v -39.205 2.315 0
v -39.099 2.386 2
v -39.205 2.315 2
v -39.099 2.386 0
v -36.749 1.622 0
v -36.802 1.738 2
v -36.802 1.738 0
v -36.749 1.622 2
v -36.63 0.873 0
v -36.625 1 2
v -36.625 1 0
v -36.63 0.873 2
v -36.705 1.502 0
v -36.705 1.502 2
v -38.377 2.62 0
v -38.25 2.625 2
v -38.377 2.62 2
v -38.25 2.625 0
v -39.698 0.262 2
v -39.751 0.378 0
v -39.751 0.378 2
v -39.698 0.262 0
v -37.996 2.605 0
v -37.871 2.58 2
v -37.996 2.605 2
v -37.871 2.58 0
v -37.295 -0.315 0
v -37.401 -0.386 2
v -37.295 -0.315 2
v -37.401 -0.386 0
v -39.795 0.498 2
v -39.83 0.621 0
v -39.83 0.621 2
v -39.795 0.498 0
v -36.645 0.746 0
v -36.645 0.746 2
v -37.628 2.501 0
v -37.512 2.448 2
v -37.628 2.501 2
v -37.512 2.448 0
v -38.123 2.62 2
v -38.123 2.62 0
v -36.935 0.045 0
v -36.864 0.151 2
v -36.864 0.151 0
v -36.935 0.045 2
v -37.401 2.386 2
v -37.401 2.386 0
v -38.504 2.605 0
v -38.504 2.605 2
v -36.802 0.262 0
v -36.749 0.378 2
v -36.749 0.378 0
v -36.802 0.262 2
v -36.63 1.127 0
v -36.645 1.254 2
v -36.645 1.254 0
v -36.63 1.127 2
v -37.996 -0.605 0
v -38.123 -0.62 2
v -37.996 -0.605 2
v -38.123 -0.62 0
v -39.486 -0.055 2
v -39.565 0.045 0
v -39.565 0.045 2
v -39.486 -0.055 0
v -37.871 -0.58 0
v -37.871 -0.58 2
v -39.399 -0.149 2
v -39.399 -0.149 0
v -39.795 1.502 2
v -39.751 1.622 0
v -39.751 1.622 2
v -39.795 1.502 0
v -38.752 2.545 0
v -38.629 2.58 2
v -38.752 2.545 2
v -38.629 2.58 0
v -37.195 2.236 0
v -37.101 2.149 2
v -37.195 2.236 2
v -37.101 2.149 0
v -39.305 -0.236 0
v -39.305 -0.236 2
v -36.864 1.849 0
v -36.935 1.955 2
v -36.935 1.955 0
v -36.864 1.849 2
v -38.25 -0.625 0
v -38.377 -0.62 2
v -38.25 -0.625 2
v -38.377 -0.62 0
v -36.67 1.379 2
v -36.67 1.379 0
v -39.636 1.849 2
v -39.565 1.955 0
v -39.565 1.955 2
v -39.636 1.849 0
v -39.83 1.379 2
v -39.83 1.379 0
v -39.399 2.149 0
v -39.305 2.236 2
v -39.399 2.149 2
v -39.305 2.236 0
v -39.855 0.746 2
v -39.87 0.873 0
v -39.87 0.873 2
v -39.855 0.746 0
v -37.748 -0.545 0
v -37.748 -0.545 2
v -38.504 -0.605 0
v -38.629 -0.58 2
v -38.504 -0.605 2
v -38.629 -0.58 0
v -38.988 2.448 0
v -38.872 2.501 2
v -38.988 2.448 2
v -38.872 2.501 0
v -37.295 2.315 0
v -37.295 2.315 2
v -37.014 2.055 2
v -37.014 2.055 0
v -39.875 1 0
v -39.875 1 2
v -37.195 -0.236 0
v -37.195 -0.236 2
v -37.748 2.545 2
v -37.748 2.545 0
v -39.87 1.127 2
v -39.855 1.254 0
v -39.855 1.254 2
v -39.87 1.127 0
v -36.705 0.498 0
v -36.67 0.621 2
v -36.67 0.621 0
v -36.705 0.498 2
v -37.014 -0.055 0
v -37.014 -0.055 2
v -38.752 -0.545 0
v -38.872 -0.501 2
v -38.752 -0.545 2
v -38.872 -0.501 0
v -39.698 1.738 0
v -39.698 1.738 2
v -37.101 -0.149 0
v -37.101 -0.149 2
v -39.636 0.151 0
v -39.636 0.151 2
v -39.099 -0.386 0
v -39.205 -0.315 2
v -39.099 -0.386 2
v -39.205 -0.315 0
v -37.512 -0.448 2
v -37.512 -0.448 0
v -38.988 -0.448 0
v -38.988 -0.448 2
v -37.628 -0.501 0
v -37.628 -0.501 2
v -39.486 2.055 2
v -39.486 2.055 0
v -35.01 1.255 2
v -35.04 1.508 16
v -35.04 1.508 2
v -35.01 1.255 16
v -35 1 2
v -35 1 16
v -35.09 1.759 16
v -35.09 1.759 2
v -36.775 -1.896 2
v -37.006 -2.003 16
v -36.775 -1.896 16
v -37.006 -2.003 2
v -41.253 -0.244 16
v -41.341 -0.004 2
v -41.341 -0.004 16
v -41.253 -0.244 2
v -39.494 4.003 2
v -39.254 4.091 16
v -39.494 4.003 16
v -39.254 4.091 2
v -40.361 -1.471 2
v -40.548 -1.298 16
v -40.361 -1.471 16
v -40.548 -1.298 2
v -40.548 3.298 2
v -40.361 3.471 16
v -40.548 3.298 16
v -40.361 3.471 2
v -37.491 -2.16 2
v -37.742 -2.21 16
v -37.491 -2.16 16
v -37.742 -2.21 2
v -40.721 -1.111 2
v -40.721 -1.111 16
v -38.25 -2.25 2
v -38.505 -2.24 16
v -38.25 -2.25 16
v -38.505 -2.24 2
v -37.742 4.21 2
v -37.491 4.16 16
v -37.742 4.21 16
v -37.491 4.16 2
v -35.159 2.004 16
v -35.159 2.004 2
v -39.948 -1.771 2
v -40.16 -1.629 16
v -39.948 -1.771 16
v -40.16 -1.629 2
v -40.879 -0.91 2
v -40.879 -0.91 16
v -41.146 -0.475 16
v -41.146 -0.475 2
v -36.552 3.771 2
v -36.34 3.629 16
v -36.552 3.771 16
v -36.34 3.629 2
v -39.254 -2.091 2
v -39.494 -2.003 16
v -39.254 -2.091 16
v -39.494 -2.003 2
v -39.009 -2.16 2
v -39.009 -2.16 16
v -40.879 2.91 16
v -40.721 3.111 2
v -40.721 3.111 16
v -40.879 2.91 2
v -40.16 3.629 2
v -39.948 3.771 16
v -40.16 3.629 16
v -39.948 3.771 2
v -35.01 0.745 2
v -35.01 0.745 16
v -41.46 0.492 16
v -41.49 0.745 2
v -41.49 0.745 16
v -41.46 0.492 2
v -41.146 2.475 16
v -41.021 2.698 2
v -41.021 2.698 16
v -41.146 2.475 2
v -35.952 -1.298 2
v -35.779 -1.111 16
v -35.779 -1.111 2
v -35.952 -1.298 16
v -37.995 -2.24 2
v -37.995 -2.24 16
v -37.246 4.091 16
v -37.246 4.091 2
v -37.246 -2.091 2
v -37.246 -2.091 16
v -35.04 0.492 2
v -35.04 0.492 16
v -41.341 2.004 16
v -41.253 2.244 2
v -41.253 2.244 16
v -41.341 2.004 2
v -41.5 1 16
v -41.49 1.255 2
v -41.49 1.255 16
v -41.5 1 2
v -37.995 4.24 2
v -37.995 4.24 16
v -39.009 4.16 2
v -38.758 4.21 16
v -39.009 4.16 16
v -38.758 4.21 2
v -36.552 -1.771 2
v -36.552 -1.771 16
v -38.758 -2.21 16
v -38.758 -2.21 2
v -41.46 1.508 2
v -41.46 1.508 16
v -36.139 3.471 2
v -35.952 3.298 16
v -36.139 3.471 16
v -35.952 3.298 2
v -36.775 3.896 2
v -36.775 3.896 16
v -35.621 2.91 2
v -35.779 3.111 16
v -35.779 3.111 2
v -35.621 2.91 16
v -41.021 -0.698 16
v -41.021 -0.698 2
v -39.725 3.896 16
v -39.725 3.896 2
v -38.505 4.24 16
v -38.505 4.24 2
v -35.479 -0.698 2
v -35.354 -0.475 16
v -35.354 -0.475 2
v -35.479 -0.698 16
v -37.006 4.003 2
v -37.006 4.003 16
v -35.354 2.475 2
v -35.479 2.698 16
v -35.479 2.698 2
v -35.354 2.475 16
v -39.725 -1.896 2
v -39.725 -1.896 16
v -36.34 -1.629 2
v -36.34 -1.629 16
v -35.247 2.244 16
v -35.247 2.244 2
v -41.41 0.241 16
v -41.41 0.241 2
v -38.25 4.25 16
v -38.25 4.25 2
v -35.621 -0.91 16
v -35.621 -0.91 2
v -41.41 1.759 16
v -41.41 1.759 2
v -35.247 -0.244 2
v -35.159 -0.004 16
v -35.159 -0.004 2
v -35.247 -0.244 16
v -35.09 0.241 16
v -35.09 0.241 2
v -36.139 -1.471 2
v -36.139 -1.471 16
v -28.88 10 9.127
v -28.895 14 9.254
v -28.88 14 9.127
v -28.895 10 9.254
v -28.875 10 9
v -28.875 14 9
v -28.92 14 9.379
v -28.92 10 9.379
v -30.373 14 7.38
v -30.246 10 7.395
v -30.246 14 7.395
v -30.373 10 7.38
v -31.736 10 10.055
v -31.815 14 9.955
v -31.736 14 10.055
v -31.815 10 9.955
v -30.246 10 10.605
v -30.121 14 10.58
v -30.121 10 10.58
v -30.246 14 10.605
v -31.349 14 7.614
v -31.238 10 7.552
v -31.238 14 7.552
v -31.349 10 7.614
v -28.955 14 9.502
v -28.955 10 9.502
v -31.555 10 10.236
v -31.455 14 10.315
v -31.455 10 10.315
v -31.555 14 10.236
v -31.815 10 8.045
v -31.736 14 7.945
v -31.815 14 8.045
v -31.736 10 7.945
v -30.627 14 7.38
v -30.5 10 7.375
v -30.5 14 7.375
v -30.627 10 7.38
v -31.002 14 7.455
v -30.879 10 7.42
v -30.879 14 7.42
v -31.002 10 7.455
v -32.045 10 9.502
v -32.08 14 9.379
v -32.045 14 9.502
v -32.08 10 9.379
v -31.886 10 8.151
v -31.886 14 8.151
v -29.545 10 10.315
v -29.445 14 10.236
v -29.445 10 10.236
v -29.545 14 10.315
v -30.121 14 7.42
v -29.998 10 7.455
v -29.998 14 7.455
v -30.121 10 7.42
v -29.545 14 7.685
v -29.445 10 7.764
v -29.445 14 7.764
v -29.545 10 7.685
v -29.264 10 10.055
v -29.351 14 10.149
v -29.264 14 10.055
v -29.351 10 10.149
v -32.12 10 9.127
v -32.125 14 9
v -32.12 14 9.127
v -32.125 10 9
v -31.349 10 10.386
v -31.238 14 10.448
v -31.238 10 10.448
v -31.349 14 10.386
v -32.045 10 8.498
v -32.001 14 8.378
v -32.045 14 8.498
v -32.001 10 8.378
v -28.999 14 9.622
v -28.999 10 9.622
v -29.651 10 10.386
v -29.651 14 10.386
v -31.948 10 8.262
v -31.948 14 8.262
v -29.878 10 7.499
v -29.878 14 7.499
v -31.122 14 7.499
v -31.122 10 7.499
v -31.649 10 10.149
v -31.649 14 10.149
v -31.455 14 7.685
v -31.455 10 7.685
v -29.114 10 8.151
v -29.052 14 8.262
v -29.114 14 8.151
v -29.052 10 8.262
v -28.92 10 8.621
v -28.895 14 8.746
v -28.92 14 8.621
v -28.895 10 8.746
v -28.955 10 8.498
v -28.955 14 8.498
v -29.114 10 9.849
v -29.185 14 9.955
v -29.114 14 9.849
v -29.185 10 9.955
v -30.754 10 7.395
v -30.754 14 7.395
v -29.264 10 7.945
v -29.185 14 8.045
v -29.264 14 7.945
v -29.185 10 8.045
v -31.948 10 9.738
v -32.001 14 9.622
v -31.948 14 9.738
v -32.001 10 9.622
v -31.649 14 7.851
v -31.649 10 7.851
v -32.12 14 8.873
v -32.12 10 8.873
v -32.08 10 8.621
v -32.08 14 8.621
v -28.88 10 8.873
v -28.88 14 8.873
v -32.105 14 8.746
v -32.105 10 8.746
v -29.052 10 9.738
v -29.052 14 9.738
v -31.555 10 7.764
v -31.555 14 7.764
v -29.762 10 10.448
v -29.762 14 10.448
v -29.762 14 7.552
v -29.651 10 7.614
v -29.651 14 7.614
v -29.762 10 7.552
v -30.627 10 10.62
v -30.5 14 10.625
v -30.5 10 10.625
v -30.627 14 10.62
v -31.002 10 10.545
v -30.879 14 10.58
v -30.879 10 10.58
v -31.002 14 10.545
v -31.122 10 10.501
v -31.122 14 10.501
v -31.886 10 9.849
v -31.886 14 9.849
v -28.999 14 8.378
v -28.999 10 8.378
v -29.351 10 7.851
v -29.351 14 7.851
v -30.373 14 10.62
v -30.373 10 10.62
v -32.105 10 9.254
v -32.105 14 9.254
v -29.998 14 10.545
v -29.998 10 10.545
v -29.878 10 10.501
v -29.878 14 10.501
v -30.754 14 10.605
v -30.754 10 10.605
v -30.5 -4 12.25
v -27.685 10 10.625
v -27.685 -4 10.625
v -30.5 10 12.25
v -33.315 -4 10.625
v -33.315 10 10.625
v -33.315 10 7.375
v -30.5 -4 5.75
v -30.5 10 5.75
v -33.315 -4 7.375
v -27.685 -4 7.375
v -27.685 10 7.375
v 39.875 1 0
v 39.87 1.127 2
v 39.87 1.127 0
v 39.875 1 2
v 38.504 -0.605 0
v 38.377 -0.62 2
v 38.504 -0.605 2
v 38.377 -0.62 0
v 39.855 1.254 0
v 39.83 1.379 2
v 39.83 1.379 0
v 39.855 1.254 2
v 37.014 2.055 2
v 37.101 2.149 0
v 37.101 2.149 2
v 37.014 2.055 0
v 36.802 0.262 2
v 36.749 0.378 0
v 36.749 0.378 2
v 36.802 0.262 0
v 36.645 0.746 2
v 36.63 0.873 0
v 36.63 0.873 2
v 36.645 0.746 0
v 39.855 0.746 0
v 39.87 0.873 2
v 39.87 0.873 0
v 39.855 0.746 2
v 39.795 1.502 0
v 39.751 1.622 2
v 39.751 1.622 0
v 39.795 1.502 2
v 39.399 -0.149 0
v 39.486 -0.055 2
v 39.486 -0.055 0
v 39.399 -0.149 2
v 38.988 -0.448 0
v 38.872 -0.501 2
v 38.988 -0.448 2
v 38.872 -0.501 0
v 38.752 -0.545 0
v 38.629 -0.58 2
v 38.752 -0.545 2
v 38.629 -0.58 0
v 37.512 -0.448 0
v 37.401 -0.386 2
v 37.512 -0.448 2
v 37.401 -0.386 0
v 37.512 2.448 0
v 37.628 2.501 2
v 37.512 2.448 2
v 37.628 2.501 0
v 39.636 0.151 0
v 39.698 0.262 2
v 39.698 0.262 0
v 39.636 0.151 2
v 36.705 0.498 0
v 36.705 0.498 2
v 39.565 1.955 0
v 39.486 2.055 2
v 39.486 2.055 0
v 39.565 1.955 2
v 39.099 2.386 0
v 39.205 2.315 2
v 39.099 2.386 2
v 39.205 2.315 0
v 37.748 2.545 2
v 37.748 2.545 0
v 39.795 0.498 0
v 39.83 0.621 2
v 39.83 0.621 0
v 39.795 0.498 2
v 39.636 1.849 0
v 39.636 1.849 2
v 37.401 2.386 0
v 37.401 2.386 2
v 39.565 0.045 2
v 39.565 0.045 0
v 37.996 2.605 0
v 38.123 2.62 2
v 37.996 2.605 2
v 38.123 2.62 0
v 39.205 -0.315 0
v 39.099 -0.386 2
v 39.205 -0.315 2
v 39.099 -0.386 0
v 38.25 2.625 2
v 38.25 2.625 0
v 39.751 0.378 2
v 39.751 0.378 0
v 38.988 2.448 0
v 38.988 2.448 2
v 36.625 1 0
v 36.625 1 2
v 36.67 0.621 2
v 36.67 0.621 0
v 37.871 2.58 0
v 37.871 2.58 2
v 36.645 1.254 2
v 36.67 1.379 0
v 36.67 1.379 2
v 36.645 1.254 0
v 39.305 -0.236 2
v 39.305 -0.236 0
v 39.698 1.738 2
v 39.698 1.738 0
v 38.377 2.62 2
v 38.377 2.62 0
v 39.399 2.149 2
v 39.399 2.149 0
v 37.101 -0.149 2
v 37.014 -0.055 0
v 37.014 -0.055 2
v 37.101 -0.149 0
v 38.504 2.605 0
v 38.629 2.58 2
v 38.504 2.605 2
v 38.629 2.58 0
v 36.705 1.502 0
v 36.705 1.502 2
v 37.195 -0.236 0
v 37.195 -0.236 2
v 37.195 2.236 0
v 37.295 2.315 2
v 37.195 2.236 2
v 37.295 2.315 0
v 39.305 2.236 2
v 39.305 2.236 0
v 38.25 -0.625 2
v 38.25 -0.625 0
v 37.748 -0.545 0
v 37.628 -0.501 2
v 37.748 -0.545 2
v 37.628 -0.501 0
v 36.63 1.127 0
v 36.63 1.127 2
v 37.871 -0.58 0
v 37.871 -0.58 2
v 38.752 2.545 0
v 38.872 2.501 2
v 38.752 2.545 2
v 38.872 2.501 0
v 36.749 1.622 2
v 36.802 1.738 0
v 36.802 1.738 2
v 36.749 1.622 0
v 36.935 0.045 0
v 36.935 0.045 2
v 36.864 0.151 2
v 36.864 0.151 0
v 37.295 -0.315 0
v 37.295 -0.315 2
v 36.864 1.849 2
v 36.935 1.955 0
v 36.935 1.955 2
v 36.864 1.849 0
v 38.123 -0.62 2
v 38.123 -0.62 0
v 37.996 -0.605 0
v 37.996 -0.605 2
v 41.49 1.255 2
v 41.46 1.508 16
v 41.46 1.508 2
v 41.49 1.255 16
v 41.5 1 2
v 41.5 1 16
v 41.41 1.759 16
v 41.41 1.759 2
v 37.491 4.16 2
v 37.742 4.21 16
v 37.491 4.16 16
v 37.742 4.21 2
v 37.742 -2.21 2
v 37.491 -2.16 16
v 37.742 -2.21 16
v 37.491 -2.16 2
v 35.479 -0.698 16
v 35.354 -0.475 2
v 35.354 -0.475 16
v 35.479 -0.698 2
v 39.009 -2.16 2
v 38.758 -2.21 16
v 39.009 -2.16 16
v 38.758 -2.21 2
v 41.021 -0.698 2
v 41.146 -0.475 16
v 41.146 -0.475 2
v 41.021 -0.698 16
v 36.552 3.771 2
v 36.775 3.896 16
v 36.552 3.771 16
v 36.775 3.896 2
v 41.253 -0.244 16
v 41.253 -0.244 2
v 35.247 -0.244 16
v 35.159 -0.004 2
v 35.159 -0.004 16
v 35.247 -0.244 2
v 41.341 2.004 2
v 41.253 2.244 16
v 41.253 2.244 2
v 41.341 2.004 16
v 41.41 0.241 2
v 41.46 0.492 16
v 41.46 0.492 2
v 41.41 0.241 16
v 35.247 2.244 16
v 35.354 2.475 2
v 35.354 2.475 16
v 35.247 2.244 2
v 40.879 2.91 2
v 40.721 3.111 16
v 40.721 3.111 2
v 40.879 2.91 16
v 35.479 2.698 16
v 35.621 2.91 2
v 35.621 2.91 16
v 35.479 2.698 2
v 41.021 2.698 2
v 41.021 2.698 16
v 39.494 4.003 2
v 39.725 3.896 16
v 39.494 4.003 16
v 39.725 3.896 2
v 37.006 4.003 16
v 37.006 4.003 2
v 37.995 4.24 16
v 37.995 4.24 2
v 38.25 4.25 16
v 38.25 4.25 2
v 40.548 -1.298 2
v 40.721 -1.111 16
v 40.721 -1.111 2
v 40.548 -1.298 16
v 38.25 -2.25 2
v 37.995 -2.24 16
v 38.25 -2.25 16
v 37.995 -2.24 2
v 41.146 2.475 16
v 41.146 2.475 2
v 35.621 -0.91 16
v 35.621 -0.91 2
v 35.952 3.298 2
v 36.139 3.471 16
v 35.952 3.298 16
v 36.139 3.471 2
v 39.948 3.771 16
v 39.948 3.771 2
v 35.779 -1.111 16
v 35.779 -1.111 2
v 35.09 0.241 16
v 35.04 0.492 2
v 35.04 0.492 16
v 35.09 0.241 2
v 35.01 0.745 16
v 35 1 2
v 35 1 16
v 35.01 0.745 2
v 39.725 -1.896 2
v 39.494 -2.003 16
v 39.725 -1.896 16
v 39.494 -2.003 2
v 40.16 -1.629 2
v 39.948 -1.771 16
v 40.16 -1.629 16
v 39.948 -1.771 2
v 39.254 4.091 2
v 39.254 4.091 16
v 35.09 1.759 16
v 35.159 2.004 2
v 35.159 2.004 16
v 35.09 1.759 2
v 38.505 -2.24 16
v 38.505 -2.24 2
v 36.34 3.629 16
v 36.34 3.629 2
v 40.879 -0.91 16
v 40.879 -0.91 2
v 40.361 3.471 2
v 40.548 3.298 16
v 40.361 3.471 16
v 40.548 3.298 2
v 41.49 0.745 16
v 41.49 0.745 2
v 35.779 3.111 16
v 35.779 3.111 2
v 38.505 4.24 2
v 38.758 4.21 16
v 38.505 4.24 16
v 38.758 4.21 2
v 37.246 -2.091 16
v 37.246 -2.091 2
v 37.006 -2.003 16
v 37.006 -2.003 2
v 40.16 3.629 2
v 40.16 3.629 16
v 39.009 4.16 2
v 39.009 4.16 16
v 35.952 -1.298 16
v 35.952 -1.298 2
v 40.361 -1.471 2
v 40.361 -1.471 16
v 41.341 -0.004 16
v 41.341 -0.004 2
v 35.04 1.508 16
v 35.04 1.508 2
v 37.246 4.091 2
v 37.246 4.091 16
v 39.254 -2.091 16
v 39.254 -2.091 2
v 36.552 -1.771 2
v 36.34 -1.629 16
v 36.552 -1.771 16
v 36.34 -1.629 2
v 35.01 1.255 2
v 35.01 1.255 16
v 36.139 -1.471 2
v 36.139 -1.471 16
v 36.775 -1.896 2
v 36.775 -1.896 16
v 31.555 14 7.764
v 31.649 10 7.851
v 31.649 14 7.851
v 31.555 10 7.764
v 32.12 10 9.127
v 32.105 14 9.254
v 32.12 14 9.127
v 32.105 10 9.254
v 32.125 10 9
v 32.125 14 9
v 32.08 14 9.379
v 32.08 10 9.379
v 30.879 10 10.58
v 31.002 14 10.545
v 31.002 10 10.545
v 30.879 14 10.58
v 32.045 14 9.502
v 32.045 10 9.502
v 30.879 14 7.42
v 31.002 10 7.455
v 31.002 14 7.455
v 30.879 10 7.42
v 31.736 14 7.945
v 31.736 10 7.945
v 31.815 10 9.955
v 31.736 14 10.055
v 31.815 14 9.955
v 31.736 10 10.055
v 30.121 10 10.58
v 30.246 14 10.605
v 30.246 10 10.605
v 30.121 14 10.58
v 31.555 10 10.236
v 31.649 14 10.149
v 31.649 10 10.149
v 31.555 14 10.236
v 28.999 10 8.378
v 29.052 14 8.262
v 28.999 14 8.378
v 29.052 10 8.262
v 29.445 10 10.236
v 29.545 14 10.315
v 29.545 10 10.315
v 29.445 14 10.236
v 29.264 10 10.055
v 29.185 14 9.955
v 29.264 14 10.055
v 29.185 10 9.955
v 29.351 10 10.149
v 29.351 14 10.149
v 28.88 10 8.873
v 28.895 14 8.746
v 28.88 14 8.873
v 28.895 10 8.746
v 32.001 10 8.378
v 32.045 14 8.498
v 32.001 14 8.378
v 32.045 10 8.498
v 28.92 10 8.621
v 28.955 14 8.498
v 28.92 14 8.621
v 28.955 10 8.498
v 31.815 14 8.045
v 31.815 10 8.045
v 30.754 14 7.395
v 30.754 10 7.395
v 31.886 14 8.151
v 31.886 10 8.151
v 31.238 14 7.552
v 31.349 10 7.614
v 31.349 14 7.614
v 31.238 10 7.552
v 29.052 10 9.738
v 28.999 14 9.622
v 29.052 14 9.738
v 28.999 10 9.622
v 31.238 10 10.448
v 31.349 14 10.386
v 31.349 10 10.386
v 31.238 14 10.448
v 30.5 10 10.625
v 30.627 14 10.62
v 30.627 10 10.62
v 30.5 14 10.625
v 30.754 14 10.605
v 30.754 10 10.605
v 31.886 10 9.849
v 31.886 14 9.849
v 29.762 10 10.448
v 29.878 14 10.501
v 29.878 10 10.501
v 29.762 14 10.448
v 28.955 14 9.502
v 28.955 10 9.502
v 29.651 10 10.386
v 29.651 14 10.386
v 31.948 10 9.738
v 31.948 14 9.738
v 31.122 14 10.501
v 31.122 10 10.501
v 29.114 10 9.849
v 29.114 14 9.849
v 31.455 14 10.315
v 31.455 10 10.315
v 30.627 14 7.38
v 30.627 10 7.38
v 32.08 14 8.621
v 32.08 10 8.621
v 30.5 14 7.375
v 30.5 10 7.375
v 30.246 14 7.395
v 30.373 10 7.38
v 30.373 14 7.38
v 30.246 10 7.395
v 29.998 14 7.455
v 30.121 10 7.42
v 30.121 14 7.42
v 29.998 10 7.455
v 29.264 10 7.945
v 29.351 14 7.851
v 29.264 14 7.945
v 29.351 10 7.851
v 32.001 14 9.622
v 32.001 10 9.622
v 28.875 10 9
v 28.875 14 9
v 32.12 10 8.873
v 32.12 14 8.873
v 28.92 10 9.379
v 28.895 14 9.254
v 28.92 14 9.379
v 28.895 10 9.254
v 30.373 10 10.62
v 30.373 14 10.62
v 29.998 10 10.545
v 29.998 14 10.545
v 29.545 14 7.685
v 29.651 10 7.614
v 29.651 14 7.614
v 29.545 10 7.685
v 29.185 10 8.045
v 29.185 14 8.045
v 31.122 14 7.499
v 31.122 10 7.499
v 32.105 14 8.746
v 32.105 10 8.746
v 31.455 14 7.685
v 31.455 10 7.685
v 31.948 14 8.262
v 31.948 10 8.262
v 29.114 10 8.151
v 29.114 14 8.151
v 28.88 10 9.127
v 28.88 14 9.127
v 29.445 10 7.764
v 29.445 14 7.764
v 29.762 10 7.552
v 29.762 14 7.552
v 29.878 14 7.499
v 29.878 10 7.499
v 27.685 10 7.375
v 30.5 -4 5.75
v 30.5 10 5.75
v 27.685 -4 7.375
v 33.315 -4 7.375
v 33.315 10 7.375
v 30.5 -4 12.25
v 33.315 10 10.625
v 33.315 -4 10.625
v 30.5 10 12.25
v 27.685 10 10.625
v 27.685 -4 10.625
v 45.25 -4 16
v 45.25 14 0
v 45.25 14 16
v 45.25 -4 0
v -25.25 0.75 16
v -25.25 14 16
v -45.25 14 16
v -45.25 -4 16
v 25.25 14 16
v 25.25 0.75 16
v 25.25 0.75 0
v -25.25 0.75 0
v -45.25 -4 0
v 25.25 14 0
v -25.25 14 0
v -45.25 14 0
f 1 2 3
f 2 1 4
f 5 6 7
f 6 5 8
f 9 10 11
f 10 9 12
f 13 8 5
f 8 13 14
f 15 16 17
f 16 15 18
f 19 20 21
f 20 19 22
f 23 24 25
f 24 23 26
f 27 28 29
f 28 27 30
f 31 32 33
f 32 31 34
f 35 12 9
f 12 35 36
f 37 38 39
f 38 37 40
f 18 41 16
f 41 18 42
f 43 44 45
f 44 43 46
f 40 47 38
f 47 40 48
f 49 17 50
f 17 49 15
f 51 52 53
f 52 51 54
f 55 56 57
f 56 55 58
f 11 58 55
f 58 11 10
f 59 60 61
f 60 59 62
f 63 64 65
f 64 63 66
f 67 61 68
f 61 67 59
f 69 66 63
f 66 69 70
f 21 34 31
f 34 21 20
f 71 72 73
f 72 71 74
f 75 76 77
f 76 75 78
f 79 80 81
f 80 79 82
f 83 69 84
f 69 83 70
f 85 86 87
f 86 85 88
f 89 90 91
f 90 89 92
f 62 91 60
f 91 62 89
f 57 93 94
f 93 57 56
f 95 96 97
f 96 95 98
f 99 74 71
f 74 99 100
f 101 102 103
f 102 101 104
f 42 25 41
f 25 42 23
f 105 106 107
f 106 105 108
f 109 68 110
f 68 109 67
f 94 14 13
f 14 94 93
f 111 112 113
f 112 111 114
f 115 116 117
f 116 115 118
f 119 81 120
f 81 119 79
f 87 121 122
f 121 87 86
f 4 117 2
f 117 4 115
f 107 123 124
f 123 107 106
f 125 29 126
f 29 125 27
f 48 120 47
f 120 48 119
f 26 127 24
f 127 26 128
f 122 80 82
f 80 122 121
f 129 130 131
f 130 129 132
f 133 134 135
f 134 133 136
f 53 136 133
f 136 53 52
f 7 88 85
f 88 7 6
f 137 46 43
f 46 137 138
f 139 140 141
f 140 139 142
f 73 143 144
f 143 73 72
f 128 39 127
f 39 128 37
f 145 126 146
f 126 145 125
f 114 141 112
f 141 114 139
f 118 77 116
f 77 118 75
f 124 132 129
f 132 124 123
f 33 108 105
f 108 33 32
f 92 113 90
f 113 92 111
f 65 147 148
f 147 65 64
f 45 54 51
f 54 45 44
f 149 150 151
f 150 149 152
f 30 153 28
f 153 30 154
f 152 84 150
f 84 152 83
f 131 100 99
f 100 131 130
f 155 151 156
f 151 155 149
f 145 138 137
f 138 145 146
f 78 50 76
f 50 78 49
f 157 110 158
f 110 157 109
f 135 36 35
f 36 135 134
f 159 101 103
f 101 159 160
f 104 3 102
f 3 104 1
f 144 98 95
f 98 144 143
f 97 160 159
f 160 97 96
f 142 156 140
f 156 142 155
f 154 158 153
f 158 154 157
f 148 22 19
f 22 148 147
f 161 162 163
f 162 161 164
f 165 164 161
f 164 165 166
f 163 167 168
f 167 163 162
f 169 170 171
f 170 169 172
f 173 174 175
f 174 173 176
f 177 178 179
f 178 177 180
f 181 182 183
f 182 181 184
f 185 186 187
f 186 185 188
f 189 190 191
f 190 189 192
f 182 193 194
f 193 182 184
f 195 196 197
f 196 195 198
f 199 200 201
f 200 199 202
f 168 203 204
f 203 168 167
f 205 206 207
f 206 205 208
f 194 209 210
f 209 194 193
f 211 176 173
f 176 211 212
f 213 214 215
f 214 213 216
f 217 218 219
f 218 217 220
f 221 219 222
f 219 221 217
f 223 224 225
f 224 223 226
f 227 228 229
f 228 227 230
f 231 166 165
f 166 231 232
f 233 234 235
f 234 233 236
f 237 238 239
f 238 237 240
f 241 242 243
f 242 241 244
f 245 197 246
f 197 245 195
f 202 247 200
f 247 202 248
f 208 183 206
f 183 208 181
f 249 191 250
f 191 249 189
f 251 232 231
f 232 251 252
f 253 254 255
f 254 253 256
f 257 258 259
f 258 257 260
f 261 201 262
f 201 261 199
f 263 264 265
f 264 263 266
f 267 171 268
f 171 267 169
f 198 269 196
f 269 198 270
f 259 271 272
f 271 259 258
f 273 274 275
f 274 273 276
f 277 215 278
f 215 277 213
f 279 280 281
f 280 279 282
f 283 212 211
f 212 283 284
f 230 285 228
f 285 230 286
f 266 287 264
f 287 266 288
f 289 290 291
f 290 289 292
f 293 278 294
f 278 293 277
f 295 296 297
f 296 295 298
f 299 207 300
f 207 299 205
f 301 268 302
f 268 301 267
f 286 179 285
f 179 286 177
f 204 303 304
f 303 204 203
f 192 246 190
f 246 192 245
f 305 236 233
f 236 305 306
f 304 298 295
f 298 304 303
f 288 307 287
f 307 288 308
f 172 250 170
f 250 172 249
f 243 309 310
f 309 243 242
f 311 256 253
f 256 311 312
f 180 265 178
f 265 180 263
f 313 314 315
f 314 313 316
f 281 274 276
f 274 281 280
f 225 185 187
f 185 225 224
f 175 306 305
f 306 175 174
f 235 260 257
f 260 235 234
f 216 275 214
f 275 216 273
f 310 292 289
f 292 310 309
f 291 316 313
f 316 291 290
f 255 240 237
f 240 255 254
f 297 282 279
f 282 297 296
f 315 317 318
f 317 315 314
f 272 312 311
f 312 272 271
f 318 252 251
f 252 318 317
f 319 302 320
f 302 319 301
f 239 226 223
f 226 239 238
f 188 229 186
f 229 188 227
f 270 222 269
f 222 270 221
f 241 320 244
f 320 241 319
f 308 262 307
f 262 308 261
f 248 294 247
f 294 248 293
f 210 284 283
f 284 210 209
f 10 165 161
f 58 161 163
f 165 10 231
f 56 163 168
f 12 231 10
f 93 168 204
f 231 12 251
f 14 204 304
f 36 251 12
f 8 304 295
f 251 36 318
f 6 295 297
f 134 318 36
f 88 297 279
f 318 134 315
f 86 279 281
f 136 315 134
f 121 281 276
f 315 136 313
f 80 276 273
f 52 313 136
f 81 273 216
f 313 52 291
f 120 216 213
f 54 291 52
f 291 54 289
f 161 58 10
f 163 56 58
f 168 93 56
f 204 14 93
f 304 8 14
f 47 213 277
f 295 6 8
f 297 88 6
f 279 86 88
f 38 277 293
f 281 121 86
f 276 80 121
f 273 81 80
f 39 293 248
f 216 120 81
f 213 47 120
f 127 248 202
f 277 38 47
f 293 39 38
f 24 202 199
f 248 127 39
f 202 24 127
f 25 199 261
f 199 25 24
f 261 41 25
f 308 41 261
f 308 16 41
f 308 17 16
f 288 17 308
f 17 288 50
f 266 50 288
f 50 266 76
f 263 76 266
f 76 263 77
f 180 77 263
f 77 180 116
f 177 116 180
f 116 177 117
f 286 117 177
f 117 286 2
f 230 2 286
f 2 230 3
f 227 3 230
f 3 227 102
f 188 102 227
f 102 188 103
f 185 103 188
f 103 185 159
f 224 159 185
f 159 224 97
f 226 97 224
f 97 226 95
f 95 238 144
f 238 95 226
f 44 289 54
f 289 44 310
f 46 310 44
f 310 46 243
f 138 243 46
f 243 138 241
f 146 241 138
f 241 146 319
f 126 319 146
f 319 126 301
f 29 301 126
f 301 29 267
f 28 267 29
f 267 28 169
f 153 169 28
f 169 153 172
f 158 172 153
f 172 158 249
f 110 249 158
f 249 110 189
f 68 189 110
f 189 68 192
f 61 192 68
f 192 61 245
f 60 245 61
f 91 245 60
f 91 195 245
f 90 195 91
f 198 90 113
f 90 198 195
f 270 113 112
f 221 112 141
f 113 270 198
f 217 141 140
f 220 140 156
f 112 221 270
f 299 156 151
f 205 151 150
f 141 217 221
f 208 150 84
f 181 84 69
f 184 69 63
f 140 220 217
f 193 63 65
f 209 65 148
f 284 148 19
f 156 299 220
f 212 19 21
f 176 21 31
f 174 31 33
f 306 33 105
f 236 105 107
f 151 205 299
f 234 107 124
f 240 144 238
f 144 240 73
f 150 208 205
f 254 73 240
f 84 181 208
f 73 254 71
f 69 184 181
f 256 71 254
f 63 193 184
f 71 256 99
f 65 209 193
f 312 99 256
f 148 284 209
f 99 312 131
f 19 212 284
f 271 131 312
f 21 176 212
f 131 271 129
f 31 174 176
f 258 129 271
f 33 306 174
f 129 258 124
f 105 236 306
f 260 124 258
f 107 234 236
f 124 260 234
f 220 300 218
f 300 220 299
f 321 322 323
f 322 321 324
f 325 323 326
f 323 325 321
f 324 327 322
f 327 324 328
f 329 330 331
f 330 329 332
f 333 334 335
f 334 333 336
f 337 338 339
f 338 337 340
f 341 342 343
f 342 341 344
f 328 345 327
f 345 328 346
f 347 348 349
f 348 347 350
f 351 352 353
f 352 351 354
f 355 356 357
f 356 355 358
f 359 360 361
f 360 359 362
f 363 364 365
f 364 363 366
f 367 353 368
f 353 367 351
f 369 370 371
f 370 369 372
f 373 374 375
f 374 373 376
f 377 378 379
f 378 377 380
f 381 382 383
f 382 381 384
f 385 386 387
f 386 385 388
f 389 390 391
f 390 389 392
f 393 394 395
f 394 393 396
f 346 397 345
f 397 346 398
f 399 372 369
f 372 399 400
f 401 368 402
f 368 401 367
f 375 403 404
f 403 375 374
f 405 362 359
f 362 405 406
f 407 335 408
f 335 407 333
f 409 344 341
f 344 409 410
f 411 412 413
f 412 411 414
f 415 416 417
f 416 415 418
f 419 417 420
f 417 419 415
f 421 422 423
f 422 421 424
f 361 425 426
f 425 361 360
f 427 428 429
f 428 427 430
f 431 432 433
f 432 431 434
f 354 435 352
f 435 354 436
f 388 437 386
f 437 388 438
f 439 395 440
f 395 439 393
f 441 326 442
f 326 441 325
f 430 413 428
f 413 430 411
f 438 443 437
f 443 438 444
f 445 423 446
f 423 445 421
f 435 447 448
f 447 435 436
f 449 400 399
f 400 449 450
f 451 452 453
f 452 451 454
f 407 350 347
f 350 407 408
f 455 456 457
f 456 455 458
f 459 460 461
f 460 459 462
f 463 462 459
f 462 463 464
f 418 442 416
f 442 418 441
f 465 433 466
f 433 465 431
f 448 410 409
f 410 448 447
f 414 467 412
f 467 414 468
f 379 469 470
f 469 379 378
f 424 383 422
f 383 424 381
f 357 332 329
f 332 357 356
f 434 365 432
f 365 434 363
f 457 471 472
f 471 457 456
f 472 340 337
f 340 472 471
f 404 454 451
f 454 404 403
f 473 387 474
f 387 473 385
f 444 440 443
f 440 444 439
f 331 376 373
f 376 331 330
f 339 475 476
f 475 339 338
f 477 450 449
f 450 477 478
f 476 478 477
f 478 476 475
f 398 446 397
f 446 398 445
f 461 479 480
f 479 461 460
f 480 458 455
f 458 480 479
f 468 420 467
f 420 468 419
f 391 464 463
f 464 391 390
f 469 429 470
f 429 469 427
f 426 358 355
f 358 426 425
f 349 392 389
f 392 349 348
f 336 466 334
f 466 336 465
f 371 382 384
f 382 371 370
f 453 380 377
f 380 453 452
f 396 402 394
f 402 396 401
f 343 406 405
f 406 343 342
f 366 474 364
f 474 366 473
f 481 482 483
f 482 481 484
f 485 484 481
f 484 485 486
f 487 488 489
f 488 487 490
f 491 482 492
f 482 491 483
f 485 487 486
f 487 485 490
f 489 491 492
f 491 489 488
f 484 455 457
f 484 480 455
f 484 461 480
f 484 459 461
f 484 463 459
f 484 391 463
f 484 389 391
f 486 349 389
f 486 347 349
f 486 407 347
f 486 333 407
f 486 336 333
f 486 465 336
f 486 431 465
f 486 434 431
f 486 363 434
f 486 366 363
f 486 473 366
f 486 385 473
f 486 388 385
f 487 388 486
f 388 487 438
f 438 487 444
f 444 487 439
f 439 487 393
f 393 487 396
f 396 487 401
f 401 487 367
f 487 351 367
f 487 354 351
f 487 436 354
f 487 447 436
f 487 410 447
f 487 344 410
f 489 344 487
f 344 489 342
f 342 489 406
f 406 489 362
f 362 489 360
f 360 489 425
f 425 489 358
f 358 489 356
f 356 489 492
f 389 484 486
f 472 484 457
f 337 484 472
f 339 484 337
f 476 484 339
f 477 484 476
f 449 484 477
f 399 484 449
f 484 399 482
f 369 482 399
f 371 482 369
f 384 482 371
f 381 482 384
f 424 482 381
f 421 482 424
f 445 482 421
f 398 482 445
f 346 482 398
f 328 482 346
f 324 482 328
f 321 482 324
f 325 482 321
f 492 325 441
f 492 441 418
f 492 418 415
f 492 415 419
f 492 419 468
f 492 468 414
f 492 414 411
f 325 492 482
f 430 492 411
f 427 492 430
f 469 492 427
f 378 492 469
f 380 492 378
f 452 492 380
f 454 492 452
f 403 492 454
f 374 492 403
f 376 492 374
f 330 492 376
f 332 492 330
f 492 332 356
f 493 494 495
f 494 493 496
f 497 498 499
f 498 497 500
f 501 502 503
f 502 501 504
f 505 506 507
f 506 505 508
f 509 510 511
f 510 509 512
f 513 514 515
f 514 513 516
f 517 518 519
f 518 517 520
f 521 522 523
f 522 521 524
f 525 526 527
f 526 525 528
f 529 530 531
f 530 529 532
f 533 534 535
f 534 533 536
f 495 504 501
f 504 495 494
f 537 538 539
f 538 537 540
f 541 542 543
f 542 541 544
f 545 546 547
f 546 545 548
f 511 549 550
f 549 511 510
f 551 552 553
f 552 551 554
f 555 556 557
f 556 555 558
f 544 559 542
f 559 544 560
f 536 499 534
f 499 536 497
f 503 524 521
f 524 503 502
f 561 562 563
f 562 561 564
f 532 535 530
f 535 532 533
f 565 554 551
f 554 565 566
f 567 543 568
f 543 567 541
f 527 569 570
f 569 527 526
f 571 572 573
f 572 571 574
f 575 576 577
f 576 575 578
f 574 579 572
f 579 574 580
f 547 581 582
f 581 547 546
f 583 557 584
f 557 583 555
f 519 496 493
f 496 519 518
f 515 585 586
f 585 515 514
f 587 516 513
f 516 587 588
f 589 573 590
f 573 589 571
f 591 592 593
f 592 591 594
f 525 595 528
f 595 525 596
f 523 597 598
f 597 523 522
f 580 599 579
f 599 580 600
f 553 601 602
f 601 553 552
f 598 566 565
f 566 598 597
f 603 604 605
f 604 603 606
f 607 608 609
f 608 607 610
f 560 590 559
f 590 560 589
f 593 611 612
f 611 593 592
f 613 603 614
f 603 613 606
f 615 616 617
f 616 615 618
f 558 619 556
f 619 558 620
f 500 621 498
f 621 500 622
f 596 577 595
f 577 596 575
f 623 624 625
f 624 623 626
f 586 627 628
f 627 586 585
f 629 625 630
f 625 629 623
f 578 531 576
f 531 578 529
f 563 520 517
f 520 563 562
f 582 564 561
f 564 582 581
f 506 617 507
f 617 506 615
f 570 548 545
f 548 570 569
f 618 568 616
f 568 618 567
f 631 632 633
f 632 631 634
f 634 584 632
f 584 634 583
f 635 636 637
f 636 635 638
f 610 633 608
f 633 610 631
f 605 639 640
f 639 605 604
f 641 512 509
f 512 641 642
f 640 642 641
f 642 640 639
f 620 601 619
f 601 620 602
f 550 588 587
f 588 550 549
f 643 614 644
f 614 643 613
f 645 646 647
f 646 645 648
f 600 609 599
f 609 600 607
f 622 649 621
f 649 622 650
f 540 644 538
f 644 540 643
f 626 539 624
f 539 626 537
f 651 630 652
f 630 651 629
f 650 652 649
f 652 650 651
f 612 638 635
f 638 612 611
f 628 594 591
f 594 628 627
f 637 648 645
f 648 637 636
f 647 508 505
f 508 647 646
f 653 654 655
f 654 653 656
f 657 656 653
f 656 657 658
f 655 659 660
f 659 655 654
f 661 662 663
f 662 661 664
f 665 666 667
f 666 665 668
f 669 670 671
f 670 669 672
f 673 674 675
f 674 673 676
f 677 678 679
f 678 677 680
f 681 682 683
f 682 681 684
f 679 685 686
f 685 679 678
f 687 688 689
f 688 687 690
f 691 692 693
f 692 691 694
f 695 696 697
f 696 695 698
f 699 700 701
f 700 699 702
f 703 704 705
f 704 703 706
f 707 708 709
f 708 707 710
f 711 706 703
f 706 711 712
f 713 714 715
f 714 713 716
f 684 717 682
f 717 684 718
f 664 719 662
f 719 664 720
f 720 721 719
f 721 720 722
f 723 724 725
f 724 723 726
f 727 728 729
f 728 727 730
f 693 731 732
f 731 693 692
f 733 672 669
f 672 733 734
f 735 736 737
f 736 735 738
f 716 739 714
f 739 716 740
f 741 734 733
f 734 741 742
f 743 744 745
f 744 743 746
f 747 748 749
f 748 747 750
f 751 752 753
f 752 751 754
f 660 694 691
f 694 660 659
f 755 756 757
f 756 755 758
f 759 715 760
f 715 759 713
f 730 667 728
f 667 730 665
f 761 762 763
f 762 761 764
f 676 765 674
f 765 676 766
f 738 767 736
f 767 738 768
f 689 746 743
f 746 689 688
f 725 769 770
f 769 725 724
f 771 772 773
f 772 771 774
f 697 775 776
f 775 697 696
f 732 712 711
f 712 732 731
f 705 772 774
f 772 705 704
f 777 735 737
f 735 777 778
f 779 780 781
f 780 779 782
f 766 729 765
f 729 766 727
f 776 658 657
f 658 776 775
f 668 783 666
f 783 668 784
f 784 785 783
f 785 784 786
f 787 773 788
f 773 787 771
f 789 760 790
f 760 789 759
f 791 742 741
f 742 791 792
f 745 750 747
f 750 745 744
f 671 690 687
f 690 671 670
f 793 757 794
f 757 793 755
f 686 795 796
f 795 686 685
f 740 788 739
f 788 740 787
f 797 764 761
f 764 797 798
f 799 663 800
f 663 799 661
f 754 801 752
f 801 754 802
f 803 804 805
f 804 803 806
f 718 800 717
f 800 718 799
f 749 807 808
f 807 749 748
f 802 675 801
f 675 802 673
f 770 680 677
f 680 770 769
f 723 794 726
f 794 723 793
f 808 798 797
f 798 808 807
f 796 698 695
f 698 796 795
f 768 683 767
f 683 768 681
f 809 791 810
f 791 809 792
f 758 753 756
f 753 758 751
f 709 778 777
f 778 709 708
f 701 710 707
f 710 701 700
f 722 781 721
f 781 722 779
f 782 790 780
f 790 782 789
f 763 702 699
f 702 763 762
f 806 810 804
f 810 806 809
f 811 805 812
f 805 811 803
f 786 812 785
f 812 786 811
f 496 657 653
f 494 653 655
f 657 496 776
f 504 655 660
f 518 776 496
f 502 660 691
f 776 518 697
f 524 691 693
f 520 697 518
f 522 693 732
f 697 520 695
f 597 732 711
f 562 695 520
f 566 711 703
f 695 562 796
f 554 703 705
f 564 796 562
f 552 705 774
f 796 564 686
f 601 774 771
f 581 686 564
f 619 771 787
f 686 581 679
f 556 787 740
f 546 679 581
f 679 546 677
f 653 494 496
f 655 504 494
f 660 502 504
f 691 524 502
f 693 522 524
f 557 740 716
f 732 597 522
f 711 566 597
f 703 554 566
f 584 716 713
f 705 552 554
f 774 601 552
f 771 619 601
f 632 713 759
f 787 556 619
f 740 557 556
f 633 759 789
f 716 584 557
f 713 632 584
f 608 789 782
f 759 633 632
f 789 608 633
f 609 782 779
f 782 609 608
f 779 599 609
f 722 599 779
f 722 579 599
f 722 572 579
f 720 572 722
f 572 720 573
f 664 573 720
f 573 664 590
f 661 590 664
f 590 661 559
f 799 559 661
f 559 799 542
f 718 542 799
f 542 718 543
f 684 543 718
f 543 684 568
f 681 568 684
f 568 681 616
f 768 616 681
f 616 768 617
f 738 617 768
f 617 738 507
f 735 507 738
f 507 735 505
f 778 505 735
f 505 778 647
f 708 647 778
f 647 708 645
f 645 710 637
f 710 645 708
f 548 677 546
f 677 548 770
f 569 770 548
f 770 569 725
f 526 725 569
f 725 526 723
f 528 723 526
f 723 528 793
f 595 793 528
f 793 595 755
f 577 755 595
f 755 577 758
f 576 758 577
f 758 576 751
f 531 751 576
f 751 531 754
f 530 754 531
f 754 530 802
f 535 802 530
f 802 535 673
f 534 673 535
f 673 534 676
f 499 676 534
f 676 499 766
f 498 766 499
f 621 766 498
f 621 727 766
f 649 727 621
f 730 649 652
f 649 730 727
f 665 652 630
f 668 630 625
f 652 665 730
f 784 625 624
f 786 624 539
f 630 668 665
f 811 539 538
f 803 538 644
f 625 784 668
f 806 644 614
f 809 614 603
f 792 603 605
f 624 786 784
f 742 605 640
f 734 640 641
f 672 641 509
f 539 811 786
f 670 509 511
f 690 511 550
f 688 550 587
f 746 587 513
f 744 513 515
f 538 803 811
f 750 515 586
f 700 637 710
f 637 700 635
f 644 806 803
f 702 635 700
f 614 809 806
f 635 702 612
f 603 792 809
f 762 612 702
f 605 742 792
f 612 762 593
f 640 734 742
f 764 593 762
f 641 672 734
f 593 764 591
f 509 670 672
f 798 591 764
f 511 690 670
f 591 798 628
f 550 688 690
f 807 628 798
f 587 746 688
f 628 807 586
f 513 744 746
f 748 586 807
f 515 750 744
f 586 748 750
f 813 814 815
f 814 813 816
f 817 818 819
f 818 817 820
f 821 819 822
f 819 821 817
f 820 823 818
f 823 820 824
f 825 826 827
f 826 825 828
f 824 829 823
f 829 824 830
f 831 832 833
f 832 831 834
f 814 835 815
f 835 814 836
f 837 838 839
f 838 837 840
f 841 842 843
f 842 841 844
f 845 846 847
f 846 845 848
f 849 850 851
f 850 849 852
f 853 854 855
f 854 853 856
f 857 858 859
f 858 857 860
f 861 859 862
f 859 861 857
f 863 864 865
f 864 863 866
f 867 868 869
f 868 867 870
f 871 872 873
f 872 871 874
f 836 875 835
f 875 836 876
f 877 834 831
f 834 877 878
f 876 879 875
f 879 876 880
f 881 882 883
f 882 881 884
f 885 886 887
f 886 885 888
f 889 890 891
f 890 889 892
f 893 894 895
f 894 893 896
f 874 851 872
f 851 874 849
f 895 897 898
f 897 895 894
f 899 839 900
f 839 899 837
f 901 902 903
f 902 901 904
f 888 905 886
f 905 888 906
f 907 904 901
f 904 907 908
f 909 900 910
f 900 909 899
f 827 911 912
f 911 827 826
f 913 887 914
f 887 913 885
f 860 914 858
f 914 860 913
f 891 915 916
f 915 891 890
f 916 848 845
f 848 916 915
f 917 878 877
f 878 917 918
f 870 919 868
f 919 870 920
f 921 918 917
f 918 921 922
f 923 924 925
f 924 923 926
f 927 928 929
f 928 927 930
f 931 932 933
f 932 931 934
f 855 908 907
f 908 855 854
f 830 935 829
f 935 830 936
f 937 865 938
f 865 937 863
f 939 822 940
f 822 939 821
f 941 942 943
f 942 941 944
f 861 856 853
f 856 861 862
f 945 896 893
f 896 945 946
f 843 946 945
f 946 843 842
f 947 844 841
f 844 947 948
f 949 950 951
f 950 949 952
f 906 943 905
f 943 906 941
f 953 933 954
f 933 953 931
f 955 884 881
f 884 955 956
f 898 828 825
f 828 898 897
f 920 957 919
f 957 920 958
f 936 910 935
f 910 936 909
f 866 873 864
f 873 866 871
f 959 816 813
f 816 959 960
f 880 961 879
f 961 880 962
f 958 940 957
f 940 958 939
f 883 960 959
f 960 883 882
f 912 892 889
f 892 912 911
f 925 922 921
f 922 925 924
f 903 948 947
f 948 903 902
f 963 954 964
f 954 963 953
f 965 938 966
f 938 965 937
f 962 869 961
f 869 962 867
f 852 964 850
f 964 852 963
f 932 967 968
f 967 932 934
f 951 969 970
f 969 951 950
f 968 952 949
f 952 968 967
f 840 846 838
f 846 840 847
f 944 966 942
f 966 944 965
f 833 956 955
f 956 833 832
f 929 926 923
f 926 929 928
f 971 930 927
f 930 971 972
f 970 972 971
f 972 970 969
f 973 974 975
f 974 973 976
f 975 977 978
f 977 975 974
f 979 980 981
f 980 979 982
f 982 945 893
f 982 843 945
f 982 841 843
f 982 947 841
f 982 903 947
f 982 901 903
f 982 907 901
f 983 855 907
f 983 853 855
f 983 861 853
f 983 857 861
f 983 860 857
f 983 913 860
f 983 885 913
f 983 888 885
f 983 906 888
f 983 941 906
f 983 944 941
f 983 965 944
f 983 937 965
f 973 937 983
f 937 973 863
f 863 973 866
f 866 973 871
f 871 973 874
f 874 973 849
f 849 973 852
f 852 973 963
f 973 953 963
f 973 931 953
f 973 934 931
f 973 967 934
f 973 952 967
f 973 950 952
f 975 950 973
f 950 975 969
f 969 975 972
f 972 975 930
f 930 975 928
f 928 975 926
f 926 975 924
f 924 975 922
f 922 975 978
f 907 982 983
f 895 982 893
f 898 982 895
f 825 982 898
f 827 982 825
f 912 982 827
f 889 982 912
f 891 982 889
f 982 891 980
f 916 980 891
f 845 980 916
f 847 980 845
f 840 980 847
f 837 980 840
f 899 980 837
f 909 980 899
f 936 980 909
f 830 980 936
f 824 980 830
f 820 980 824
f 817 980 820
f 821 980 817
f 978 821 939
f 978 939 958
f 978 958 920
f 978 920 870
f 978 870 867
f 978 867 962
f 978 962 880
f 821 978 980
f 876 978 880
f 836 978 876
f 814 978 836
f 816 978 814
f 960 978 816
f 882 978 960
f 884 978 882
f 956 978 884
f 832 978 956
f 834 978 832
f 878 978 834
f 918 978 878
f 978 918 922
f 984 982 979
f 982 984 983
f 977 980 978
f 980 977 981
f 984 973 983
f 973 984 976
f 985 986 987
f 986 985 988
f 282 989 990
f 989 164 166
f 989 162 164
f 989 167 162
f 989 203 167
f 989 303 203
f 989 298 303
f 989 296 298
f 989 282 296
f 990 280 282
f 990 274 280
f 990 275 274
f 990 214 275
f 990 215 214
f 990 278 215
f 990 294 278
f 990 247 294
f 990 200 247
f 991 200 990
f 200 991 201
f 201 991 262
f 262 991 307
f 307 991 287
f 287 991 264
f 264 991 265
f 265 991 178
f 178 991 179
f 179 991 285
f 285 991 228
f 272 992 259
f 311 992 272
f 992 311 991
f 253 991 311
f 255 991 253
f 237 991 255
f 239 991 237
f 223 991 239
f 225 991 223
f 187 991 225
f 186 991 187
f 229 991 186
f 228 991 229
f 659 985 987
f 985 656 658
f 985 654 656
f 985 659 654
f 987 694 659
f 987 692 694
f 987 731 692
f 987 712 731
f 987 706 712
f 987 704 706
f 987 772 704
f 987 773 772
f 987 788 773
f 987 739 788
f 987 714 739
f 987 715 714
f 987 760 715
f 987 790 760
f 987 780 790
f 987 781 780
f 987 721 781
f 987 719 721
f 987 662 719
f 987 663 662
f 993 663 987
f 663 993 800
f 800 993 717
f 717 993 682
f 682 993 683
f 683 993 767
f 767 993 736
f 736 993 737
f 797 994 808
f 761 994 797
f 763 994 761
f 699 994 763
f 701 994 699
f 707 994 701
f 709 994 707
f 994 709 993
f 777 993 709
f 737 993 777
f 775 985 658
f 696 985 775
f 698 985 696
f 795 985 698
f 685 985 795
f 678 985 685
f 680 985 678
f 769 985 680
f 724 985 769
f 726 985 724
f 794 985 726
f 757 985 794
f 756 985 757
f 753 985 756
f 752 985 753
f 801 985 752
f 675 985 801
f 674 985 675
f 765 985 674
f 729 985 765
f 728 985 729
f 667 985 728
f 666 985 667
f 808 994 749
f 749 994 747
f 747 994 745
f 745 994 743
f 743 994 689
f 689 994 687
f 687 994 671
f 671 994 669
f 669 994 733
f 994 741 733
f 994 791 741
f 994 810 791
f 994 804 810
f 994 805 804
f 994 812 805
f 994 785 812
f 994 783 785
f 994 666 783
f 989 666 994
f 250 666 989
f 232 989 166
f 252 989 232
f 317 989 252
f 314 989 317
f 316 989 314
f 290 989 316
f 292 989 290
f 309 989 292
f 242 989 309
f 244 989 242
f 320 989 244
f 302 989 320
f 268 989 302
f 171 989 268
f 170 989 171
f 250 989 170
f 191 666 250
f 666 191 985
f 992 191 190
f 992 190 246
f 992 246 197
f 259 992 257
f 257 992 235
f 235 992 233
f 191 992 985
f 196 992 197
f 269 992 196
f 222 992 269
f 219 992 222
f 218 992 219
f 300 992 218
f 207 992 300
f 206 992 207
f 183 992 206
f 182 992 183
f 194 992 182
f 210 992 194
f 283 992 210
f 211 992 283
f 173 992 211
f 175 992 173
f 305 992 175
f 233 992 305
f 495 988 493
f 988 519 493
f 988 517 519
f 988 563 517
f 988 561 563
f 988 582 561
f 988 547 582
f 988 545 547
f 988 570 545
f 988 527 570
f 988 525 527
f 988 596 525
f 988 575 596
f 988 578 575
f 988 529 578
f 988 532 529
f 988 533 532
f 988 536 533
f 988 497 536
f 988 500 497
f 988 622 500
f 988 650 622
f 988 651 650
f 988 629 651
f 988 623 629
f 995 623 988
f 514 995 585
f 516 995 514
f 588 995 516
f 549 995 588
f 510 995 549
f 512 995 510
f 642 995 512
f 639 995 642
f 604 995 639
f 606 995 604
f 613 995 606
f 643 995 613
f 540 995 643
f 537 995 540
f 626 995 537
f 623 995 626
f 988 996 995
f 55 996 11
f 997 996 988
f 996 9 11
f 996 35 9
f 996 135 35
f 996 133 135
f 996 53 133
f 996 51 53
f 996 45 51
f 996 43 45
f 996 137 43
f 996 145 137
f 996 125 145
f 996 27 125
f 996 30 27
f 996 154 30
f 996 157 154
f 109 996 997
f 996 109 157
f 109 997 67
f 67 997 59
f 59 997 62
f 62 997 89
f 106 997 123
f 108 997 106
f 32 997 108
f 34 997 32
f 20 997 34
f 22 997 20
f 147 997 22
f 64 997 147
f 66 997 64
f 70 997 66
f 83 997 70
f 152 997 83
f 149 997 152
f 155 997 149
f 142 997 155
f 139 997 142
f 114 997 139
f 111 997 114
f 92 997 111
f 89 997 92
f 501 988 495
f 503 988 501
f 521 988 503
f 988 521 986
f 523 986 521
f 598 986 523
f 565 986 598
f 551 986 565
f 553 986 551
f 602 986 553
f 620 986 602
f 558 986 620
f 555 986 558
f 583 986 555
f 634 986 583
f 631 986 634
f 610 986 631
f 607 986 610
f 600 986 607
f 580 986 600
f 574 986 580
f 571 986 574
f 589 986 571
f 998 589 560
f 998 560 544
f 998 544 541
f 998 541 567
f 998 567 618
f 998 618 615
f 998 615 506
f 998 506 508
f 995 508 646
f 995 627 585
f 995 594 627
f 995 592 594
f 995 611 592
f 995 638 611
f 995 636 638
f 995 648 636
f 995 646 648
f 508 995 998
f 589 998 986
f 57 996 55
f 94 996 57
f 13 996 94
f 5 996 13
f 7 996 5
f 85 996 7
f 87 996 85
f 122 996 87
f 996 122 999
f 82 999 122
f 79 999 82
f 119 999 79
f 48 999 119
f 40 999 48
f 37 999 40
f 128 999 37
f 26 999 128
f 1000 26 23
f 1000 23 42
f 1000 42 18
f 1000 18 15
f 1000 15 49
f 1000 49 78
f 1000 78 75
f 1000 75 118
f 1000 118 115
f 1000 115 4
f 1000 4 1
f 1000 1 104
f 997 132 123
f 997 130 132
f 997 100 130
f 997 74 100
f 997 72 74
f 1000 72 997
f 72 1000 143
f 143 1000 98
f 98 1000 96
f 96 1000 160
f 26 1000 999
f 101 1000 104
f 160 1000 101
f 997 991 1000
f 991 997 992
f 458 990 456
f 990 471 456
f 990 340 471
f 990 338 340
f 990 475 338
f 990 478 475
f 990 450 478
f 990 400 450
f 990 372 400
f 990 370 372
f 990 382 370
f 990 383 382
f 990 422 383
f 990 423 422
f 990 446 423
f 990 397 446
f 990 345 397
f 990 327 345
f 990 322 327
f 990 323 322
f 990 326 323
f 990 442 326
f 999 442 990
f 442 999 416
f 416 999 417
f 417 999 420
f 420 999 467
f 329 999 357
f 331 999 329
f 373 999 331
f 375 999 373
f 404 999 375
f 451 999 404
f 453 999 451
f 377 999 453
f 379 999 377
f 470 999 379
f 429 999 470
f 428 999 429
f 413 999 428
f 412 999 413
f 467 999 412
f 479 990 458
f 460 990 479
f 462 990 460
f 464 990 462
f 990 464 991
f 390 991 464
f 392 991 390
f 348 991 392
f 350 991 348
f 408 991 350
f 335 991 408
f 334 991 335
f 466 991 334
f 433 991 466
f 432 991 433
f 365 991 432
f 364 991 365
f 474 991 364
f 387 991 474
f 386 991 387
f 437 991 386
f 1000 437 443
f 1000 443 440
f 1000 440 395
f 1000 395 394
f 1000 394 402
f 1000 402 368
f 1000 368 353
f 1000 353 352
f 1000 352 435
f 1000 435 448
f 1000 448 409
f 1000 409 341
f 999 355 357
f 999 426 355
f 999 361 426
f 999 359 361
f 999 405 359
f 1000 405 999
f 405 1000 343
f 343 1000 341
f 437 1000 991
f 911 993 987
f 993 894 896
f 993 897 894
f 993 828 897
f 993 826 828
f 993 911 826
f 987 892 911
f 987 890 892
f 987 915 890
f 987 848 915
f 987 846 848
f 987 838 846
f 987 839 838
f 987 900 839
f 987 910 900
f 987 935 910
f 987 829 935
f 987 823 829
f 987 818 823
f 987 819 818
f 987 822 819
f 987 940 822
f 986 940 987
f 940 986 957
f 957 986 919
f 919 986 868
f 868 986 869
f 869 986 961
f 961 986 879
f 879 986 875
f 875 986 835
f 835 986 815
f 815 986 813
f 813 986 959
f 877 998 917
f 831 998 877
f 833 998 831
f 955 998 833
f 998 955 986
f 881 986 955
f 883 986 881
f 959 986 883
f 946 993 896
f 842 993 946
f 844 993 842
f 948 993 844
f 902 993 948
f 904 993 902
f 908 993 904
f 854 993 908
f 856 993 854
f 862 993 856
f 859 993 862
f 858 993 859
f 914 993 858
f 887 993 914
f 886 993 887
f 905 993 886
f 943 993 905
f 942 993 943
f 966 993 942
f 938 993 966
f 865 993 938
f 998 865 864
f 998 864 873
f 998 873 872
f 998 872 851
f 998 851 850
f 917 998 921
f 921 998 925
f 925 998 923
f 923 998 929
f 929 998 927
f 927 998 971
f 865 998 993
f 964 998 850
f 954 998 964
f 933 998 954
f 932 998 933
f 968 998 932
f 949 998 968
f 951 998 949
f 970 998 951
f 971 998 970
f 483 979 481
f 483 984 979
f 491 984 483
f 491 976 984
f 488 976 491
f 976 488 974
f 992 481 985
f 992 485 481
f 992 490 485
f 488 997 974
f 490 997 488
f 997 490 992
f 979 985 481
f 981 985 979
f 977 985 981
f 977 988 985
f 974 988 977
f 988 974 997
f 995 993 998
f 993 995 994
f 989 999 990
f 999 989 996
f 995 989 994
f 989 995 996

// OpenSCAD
// file: configuration.scad
// Increase this if your slicer or printer make holes too tight.
extra_radius = 0.0;

// OD = outside diameter, corner to corner.
m3_nut_od = 6.1;
m3_nut_radius = m3_nut_od/2 + 0.2 + extra_radius;
m3_washer_radius = 3.5 + extra_radius;

// Major diameter of metric 3mm thread.
m3_major = 2.85;
m3_radius = m3_major/2 + extra_radius;
m3_wide_radius = m3_major/2 + extra_radius + 0.2;

// NEMA17 stepper motors.
motor_shaft_diameter = 5;
motor_shaft_radius = motor_shaft_diameter/2 + extra_radius;

// Frame brackets. M3x8mm screws work best with 3.6 mm brackets.
thickness = 3.6;

// OpenBeam or Misumi. Currently only 15x15 mm, but there is a plan
// to make models more parametric and allow 20x20 mm in the future.
extrusion = 15;

// Placement for the NEMA17 stepper motors.
motor_offset = 44;
motor_length = 47;
// main file
include <configuration.scad>;

space = 15;  // Between horizontal OpenBeam pieces.

power_supply_height = 30.5;
power_supply_width = 50.5;

$fn=80;
module power_supply() {
  difference() {
    translate([0, 5, 8])
      cube([power_supply_width+40, 18, 16], center=true);
    // Power supply body.
    translate([0, 7.5+space/2+1, 0]) cube([power_supply_width, power_supply_height, 100], center=true);
    // Screw holes.
    for (x = [-1, 1]) {
      translate([x*(power_supply_width/2+13), 1, 9]) cylinder(r=m3_wide_radius, h=40, center=true);
      #translate([x*(power_supply_width/2+13),1, 11]) cylinder(r=m3_nut_radius, h=18, center=true);
      translate([x*(power_supply_width/2+m3_nut_radius+2), 20, 9]) rotate([90, 0, 0]) cylinder(r=m3_wide_radius, h=40, center=true);
      translate([x*(power_supply_width/2+m3_nut_radius+2), 10, 9]) rotate([90, 30, 0]) cylinder(r=m3_nut_radius, h=40,$fn=6);
    }
  }
}

power_supply();
% translate([0, space+15, 0]) rotate([0, 0, 180]) power_supply();
